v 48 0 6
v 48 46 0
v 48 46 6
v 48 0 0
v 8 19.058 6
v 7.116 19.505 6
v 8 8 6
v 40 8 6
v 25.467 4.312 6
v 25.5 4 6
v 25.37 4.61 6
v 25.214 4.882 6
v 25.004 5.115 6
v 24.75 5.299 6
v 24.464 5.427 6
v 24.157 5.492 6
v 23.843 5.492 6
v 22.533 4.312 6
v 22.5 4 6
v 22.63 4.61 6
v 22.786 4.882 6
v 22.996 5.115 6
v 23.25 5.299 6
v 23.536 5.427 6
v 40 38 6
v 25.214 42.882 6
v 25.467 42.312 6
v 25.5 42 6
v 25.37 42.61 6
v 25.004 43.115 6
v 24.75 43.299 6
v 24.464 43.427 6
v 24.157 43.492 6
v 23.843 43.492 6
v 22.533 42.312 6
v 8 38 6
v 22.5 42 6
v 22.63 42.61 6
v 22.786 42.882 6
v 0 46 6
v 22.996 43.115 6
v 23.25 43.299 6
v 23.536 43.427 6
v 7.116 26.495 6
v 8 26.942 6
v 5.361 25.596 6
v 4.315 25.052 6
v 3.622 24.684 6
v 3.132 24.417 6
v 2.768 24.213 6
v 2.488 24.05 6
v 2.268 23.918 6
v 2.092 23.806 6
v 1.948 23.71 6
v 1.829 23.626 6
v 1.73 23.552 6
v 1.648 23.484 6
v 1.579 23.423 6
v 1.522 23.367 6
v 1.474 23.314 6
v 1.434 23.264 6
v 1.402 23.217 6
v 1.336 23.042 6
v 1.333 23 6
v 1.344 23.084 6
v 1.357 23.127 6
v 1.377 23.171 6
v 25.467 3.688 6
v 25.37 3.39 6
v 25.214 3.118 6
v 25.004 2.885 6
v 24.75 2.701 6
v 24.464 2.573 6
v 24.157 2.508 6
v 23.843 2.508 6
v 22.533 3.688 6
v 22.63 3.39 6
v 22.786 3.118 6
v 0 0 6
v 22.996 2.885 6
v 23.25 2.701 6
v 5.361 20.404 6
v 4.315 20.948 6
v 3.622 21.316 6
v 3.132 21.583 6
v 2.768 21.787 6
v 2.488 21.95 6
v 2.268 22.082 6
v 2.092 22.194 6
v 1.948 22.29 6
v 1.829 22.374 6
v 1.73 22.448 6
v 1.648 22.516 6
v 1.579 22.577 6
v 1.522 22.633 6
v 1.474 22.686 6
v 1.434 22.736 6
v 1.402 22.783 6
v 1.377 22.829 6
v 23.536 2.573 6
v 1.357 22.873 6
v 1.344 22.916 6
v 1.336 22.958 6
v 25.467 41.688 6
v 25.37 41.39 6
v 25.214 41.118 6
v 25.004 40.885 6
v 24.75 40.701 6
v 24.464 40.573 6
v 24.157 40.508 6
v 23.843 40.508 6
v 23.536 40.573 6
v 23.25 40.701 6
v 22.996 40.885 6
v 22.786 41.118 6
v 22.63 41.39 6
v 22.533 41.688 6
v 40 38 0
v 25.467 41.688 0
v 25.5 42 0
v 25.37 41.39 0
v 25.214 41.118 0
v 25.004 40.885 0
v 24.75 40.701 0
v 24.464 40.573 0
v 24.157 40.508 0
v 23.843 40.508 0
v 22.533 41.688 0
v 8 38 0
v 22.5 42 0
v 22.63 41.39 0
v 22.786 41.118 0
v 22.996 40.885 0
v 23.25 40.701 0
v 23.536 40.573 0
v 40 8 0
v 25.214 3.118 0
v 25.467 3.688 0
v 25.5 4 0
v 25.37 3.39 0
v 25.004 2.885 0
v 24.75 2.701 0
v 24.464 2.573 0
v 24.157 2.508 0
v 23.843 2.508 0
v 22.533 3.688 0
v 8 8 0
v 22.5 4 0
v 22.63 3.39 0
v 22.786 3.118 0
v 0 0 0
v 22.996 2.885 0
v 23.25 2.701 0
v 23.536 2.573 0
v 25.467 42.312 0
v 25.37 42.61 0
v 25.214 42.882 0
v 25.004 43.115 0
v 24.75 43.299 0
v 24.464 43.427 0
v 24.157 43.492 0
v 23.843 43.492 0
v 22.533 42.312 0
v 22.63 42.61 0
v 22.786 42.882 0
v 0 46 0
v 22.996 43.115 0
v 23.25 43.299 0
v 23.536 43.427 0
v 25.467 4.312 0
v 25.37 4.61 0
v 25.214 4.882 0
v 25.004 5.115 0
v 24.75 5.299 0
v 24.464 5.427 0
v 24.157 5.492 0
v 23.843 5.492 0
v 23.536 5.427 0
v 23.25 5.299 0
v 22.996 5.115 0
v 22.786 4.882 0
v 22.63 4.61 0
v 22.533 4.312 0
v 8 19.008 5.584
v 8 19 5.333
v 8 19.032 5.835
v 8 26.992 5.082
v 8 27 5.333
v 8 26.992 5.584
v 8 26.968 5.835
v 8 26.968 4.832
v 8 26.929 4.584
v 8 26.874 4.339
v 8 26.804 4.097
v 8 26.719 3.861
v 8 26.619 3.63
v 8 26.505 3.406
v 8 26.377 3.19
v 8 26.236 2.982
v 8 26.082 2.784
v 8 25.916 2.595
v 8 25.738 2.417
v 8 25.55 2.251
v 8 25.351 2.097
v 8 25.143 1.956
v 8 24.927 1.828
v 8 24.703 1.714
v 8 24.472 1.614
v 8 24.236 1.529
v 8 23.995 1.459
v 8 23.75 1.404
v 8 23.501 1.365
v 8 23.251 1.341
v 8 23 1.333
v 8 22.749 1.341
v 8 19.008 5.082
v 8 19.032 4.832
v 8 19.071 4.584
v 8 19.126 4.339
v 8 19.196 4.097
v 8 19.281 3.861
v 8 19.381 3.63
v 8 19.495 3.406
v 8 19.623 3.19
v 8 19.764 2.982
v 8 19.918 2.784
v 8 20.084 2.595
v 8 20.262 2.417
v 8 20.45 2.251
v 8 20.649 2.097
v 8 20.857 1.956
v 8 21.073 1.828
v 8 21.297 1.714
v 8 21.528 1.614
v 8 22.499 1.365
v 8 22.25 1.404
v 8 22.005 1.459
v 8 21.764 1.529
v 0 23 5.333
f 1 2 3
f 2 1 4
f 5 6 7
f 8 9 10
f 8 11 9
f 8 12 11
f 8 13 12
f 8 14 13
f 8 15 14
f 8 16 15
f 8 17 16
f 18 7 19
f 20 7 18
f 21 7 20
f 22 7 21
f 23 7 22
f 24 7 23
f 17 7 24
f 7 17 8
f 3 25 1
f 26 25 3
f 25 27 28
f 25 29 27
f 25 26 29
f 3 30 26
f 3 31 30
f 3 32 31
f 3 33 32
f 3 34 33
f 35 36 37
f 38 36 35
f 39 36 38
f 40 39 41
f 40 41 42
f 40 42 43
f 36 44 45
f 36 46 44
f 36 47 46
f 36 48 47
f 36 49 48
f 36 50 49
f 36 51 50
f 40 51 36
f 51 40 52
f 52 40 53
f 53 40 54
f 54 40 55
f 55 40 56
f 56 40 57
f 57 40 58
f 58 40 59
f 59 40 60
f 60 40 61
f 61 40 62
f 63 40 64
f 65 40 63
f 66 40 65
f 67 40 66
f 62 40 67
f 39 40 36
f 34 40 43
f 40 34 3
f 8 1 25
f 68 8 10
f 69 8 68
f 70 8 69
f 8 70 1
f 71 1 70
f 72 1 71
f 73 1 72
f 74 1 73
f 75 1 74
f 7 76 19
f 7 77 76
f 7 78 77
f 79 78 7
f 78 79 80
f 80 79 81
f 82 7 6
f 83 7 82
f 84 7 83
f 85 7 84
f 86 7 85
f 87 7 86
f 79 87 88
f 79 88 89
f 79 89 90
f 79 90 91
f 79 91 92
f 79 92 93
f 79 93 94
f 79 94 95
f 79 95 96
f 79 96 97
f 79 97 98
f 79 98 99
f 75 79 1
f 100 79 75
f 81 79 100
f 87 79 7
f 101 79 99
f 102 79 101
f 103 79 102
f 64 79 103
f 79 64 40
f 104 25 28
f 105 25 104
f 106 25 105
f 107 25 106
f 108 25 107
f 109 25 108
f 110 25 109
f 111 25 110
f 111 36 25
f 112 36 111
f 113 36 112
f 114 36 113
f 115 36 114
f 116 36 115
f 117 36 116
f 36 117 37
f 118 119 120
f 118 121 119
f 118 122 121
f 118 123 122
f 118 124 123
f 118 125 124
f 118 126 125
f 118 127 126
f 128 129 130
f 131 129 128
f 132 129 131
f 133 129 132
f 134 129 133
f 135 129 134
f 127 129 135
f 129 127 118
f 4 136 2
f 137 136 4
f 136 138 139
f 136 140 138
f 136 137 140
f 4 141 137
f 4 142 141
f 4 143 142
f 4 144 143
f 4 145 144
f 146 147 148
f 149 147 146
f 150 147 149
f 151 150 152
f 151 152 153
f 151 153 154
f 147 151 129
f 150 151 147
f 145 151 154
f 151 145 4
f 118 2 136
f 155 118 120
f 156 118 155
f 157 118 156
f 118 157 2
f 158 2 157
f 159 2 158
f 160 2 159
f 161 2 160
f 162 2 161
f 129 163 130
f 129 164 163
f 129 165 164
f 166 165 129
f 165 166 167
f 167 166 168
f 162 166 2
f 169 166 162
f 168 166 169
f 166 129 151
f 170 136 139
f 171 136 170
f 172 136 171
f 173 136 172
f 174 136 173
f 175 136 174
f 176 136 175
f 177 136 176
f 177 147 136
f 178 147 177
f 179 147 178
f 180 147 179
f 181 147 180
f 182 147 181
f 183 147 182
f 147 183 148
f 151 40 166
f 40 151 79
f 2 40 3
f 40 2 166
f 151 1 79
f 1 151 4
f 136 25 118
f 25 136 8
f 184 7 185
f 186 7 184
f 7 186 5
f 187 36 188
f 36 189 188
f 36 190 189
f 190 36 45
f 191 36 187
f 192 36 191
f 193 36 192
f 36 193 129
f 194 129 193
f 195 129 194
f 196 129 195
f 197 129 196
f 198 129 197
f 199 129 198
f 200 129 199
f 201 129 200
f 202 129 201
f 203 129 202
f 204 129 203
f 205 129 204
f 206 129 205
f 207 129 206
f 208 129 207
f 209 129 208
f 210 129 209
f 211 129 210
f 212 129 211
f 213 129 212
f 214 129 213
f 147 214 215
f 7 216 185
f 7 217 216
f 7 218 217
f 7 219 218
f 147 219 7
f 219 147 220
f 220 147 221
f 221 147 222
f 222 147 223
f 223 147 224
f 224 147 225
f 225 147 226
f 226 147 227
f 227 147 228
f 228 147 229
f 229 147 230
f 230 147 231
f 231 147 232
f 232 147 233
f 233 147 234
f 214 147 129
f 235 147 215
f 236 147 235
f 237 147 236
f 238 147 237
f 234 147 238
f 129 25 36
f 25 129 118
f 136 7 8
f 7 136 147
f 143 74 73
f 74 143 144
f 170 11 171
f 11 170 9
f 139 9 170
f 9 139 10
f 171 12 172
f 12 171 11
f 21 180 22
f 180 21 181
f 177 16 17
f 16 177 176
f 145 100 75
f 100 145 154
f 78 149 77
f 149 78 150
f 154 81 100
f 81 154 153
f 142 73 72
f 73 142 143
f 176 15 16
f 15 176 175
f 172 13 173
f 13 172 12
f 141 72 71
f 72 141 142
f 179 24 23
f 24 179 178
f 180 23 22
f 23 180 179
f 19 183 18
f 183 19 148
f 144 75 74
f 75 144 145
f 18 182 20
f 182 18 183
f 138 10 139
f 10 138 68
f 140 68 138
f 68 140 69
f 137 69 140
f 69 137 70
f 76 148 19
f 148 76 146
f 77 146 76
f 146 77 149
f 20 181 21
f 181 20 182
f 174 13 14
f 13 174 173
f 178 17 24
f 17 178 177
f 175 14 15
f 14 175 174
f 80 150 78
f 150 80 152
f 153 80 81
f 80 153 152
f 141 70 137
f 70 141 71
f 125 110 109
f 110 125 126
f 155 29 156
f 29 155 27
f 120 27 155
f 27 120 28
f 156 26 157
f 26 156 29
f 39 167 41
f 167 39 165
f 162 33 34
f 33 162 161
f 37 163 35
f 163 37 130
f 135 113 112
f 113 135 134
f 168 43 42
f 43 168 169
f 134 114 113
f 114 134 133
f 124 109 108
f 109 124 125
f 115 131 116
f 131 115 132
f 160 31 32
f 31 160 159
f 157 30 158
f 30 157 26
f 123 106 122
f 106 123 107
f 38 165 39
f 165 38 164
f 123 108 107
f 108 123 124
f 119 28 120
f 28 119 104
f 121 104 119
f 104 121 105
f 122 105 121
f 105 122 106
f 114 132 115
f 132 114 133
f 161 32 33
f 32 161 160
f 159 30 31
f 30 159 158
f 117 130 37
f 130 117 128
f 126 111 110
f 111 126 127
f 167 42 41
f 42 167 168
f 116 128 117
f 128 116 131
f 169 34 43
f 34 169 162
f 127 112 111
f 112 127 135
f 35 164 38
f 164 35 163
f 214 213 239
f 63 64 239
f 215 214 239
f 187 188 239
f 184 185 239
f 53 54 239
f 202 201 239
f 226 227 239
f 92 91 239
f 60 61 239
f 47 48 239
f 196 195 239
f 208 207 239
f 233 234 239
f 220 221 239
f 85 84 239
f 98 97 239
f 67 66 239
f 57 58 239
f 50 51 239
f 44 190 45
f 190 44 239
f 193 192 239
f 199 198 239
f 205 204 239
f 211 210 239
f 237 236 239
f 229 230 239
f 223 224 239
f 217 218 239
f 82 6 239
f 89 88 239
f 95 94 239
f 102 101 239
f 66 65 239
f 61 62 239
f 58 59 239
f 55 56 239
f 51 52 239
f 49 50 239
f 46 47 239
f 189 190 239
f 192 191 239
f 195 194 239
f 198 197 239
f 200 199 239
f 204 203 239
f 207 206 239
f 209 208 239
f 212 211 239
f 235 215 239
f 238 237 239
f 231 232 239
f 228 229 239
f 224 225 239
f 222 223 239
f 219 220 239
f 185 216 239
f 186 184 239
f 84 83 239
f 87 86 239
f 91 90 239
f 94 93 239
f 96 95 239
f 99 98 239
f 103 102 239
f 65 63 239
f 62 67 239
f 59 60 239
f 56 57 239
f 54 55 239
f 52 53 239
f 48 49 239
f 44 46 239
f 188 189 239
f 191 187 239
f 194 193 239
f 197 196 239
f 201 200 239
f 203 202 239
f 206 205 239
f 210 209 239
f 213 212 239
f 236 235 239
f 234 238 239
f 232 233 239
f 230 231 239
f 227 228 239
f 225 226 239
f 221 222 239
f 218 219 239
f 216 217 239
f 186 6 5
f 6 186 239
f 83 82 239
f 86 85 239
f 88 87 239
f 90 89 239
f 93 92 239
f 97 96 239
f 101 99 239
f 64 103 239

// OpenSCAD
// file: hole.scad
// hole.scad

include <globals.scad>;

// Generic hole module with optional countersink
module hole(position, diameter, height, countersink=false, countersink_diameter=6, countersink_depth=1, fn=30) {
    translate(position) {
        // Main hole
        cylinder(h=height, d=diameter, $fn=fn);
        
        // Countersink (if enabled)
        if (countersink) {
            cylinder(h=countersink_depth, d=countersink_diameter, $fn=fn);
        }
    }
}

// end hole.scad
// file: globals.scad
// ====================
// Global Parameters
// ====================


// Box dimensions

Length = 100;
Width = 60;
Height = 45;
Thickness = 5;
wall_thickness = Thickness; //wall thickness


/* [Holes To Add] */
/*
Add_16mm_hole_to_lid_centered = false;
Add_22mm_hole_to_lid_centered = false;
Add_mount_screw_holes_to_base = false;
*/

/* [Inner Screw Mount Posts] */
/*
Include_Inner_Mount_Posts = false;
Post_Height = 2.5;
Length_On_Centers = 40;
Width_On_Centers = 15;
Mount_Screw_Diameter = 2;
*/
/* [Generate] */
//Helpful to split your print into 2 separate parts.  Don't change above parameters between Generate clicks

/*
Generate_Lid = true;

Generate_Base = true;
*/
/* [Hidden] */
// of the walls in mm.
//Thickness = 3;
//Will also round side edges if Side Edge Rounding is set to less than this value. (Forced to 2.2 until I can correct oddities.)

$fn  = 100;   //circle slices (quality)


// ------------------------------------------------------------------------------
// Screw parameters
screw = 3.5;  // diameter in mm
// ------------------------------------------------------------------------------


// ------------------------------------------------------------------------------
// Mounting hole parameters
// ------------------------------------------------------------------------------
mounting_hole_diameter = 3;  // in mm
mounting_hole_offset = 3.5;  // in mm

// Micro-USB port placeholder parameters
/*
usb_hole_width = 10;  // in mm
usb_hole_height = 5;  // in mm
usb_screw_diameter = 2;  // in mm
usb_screw_offset = 2;    // in mm
*/
// Speaker parameters
// speaker_recess = 9.53;  // in mm
// speaker_offset_from_side = 5;  // in mm

// Screw tab parameters
// screw_tab_height = Thickness * 2;  // in mm
// screw_tab_diameter = mounting_hole_diameter * 2;  // in mm

// ====================
// Helper Functions
// ====================
// Function to generate hole positions
function generate_hole_positions(width, depth, offset, z=-1) = [
    [offset, offset, z],
    [width - offset, offset, z],
    [offset, depth - offset, z],
    [width - offset, depth - offset, z]
];
// file: pi_zero_panel.scad
// begin pi_zero_panel.scad

include <globals.scad>

// Raspberry Pi Zero dimensions (standard 58 mm x 23 mm)
pi_zero_width = 58;
pi_zero_depth = 23;
pi_zero_height = 1.5;  // Thickness of the Pi Zero


// Riser parameters
riser_height = 10;  // Height of the risers
riser_diameter = 6;  // Diameter of the risers
pi_hole_diameter = 2.5;  // Diameter of the Pi mounting holes

// Base plate dimensions (aligned with global wall_thickness)
base_plate_thickness = Thickness;  // Use global wall thickness
base_plate_width = pi_zero_width + 7;   // Add 7 mm for offsets (3.5 mm on each side)
base_plate_depth = pi_zero_depth + 7;   // Add 7 mm for offsets (3.5 mm on each side)


module pi_zero_cutout () {
        cube([base_plate_width, base_plate_depth, base_plate_thickness + 2]);
}

module pi_zero_panel_base() {

    // Raspberry Pi mounting hole positions (standard 58 mm x 23 mm)
    pi_hole_positions = [
        [3.5, 3.5],  // Bottom-left hole
        [3.5, 23 + 3.5],  // Top-left hole
        [58 + 3.5, 3.5],  // Bottom-right hole
        [58 + 3.5, 23 + 3.5]  // Top-right hole
    ];


    // Create the base plate
    color("purple") {
        cube([base_plate_width, base_plate_depth, base_plate_thickness]);
    }

    // Create the risers
    for (pos = pi_hole_positions) {
        translate([pos[0], pos[1], base_plate_thickness]) {
            difference() {
                // Create the riser
                cylinder(h=riser_height, d=riser_diameter, $fn=30);

                // Subtract the Pi mounting hole
                translate([0, 0, -1])
                cylinder(h=riser_height + 2, d=pi_hole_diameter, $fn=30);  // Add 2 mm to ensure the hole goes all the way through
            }
        }
    }
}

module pi_zero_panel() {
        pi_zero_panel_base();
}

// end pi_zero_panel.scad
// file: speaker_panel.scad
// begin speaker_panel.scad

include <globals.scad>
include <hole.scad>

//Thickness = 3;

// Speaker parameters
speaker_size = 28.575;  // 1 1/8" square

sp_width = 32;
sp_height = 30;


sp_thickness = Thickness;
//sp_thickness = 3;
// 1.22: 30.988
// 1.11: 28.194
// 0.18 to center: 4.572
// 0.24: 6.096

sp_border_width = 8;  // no idea if this is right.  I'm thinking 3/8"

//speaker_panel_size = speaker_size + (2 * border_width);


// wall_thickness = sp_thickness;
wall_thickness = Thickness;

sp_cutout_width = sp_width + (sp_border_width * 2);
sp_cutout_height = sp_height + (sp_border_width * 2);

module speaker_cutout() {
    //cube([sp_width + (sp_border_width * 2),sp_height + (sp_border_width * 2),sp_thickness]);  
    cube([sp_cutout_width,sp_cutout_height,sp_thickness + 5]);  
}

module speaker_panel_base() {
    spb_outer_width = sp_width + (sp_border_width * 2);
    spb_outer_height = sp_height + (sp_border_width * 2);
    // The frame
    difference () {
        echo ("outer: ", spb_outer_width, spb_outer_height,sp_thickness / 2);
        echo ("die:   ", sp_width,sp_height,sp_thickness * 2.2);

        //cube([spb_outer_width,spb_outer_height,sp_thickness /2]);
        cube([spb_outer_width,spb_outer_height,sp_thickness + 1]);
        translate([sp_border_width,sp_border_width,-1]) // "-1" is to push it low and punch all the way through.
         cube([sp_width,sp_height,sp_thickness * 2.2]); // * 2.2 is to make the "die" bigger than the blank it's punching through.

        // Now the orientation matters.  We need 2 screw holes.
        hole([spb_outer_width / 2,sp_border_width/2,0], mounting_hole_diameter, sp_thickness*2, countersink=false);

        hole([spb_outer_width / 2,spb_outer_height - (sp_border_width / 2),0], mounting_hole_diameter, sp_thickness*2, countersink=false);


        offset = 2;
        ch = sp_border_width + offset;
        cr1 = 0;
        cr2 = sp_thickness;

        translate([0,sp_cutout_height / 2,sp_border_width/1.5])
        rotate([0,90,0])
        cylinder(h=ch,r1=cr1,r2=cr2);
    }
}

module speaker_panel() {
    speaker_panel_base();
}

// end speaker_panel.scad
// main file
// include <moonecase_3.scad>

// Cut outs and panels.

include <speaker_panel.scad>
include <pi_zero_panel.scad>



speaker_panel();
